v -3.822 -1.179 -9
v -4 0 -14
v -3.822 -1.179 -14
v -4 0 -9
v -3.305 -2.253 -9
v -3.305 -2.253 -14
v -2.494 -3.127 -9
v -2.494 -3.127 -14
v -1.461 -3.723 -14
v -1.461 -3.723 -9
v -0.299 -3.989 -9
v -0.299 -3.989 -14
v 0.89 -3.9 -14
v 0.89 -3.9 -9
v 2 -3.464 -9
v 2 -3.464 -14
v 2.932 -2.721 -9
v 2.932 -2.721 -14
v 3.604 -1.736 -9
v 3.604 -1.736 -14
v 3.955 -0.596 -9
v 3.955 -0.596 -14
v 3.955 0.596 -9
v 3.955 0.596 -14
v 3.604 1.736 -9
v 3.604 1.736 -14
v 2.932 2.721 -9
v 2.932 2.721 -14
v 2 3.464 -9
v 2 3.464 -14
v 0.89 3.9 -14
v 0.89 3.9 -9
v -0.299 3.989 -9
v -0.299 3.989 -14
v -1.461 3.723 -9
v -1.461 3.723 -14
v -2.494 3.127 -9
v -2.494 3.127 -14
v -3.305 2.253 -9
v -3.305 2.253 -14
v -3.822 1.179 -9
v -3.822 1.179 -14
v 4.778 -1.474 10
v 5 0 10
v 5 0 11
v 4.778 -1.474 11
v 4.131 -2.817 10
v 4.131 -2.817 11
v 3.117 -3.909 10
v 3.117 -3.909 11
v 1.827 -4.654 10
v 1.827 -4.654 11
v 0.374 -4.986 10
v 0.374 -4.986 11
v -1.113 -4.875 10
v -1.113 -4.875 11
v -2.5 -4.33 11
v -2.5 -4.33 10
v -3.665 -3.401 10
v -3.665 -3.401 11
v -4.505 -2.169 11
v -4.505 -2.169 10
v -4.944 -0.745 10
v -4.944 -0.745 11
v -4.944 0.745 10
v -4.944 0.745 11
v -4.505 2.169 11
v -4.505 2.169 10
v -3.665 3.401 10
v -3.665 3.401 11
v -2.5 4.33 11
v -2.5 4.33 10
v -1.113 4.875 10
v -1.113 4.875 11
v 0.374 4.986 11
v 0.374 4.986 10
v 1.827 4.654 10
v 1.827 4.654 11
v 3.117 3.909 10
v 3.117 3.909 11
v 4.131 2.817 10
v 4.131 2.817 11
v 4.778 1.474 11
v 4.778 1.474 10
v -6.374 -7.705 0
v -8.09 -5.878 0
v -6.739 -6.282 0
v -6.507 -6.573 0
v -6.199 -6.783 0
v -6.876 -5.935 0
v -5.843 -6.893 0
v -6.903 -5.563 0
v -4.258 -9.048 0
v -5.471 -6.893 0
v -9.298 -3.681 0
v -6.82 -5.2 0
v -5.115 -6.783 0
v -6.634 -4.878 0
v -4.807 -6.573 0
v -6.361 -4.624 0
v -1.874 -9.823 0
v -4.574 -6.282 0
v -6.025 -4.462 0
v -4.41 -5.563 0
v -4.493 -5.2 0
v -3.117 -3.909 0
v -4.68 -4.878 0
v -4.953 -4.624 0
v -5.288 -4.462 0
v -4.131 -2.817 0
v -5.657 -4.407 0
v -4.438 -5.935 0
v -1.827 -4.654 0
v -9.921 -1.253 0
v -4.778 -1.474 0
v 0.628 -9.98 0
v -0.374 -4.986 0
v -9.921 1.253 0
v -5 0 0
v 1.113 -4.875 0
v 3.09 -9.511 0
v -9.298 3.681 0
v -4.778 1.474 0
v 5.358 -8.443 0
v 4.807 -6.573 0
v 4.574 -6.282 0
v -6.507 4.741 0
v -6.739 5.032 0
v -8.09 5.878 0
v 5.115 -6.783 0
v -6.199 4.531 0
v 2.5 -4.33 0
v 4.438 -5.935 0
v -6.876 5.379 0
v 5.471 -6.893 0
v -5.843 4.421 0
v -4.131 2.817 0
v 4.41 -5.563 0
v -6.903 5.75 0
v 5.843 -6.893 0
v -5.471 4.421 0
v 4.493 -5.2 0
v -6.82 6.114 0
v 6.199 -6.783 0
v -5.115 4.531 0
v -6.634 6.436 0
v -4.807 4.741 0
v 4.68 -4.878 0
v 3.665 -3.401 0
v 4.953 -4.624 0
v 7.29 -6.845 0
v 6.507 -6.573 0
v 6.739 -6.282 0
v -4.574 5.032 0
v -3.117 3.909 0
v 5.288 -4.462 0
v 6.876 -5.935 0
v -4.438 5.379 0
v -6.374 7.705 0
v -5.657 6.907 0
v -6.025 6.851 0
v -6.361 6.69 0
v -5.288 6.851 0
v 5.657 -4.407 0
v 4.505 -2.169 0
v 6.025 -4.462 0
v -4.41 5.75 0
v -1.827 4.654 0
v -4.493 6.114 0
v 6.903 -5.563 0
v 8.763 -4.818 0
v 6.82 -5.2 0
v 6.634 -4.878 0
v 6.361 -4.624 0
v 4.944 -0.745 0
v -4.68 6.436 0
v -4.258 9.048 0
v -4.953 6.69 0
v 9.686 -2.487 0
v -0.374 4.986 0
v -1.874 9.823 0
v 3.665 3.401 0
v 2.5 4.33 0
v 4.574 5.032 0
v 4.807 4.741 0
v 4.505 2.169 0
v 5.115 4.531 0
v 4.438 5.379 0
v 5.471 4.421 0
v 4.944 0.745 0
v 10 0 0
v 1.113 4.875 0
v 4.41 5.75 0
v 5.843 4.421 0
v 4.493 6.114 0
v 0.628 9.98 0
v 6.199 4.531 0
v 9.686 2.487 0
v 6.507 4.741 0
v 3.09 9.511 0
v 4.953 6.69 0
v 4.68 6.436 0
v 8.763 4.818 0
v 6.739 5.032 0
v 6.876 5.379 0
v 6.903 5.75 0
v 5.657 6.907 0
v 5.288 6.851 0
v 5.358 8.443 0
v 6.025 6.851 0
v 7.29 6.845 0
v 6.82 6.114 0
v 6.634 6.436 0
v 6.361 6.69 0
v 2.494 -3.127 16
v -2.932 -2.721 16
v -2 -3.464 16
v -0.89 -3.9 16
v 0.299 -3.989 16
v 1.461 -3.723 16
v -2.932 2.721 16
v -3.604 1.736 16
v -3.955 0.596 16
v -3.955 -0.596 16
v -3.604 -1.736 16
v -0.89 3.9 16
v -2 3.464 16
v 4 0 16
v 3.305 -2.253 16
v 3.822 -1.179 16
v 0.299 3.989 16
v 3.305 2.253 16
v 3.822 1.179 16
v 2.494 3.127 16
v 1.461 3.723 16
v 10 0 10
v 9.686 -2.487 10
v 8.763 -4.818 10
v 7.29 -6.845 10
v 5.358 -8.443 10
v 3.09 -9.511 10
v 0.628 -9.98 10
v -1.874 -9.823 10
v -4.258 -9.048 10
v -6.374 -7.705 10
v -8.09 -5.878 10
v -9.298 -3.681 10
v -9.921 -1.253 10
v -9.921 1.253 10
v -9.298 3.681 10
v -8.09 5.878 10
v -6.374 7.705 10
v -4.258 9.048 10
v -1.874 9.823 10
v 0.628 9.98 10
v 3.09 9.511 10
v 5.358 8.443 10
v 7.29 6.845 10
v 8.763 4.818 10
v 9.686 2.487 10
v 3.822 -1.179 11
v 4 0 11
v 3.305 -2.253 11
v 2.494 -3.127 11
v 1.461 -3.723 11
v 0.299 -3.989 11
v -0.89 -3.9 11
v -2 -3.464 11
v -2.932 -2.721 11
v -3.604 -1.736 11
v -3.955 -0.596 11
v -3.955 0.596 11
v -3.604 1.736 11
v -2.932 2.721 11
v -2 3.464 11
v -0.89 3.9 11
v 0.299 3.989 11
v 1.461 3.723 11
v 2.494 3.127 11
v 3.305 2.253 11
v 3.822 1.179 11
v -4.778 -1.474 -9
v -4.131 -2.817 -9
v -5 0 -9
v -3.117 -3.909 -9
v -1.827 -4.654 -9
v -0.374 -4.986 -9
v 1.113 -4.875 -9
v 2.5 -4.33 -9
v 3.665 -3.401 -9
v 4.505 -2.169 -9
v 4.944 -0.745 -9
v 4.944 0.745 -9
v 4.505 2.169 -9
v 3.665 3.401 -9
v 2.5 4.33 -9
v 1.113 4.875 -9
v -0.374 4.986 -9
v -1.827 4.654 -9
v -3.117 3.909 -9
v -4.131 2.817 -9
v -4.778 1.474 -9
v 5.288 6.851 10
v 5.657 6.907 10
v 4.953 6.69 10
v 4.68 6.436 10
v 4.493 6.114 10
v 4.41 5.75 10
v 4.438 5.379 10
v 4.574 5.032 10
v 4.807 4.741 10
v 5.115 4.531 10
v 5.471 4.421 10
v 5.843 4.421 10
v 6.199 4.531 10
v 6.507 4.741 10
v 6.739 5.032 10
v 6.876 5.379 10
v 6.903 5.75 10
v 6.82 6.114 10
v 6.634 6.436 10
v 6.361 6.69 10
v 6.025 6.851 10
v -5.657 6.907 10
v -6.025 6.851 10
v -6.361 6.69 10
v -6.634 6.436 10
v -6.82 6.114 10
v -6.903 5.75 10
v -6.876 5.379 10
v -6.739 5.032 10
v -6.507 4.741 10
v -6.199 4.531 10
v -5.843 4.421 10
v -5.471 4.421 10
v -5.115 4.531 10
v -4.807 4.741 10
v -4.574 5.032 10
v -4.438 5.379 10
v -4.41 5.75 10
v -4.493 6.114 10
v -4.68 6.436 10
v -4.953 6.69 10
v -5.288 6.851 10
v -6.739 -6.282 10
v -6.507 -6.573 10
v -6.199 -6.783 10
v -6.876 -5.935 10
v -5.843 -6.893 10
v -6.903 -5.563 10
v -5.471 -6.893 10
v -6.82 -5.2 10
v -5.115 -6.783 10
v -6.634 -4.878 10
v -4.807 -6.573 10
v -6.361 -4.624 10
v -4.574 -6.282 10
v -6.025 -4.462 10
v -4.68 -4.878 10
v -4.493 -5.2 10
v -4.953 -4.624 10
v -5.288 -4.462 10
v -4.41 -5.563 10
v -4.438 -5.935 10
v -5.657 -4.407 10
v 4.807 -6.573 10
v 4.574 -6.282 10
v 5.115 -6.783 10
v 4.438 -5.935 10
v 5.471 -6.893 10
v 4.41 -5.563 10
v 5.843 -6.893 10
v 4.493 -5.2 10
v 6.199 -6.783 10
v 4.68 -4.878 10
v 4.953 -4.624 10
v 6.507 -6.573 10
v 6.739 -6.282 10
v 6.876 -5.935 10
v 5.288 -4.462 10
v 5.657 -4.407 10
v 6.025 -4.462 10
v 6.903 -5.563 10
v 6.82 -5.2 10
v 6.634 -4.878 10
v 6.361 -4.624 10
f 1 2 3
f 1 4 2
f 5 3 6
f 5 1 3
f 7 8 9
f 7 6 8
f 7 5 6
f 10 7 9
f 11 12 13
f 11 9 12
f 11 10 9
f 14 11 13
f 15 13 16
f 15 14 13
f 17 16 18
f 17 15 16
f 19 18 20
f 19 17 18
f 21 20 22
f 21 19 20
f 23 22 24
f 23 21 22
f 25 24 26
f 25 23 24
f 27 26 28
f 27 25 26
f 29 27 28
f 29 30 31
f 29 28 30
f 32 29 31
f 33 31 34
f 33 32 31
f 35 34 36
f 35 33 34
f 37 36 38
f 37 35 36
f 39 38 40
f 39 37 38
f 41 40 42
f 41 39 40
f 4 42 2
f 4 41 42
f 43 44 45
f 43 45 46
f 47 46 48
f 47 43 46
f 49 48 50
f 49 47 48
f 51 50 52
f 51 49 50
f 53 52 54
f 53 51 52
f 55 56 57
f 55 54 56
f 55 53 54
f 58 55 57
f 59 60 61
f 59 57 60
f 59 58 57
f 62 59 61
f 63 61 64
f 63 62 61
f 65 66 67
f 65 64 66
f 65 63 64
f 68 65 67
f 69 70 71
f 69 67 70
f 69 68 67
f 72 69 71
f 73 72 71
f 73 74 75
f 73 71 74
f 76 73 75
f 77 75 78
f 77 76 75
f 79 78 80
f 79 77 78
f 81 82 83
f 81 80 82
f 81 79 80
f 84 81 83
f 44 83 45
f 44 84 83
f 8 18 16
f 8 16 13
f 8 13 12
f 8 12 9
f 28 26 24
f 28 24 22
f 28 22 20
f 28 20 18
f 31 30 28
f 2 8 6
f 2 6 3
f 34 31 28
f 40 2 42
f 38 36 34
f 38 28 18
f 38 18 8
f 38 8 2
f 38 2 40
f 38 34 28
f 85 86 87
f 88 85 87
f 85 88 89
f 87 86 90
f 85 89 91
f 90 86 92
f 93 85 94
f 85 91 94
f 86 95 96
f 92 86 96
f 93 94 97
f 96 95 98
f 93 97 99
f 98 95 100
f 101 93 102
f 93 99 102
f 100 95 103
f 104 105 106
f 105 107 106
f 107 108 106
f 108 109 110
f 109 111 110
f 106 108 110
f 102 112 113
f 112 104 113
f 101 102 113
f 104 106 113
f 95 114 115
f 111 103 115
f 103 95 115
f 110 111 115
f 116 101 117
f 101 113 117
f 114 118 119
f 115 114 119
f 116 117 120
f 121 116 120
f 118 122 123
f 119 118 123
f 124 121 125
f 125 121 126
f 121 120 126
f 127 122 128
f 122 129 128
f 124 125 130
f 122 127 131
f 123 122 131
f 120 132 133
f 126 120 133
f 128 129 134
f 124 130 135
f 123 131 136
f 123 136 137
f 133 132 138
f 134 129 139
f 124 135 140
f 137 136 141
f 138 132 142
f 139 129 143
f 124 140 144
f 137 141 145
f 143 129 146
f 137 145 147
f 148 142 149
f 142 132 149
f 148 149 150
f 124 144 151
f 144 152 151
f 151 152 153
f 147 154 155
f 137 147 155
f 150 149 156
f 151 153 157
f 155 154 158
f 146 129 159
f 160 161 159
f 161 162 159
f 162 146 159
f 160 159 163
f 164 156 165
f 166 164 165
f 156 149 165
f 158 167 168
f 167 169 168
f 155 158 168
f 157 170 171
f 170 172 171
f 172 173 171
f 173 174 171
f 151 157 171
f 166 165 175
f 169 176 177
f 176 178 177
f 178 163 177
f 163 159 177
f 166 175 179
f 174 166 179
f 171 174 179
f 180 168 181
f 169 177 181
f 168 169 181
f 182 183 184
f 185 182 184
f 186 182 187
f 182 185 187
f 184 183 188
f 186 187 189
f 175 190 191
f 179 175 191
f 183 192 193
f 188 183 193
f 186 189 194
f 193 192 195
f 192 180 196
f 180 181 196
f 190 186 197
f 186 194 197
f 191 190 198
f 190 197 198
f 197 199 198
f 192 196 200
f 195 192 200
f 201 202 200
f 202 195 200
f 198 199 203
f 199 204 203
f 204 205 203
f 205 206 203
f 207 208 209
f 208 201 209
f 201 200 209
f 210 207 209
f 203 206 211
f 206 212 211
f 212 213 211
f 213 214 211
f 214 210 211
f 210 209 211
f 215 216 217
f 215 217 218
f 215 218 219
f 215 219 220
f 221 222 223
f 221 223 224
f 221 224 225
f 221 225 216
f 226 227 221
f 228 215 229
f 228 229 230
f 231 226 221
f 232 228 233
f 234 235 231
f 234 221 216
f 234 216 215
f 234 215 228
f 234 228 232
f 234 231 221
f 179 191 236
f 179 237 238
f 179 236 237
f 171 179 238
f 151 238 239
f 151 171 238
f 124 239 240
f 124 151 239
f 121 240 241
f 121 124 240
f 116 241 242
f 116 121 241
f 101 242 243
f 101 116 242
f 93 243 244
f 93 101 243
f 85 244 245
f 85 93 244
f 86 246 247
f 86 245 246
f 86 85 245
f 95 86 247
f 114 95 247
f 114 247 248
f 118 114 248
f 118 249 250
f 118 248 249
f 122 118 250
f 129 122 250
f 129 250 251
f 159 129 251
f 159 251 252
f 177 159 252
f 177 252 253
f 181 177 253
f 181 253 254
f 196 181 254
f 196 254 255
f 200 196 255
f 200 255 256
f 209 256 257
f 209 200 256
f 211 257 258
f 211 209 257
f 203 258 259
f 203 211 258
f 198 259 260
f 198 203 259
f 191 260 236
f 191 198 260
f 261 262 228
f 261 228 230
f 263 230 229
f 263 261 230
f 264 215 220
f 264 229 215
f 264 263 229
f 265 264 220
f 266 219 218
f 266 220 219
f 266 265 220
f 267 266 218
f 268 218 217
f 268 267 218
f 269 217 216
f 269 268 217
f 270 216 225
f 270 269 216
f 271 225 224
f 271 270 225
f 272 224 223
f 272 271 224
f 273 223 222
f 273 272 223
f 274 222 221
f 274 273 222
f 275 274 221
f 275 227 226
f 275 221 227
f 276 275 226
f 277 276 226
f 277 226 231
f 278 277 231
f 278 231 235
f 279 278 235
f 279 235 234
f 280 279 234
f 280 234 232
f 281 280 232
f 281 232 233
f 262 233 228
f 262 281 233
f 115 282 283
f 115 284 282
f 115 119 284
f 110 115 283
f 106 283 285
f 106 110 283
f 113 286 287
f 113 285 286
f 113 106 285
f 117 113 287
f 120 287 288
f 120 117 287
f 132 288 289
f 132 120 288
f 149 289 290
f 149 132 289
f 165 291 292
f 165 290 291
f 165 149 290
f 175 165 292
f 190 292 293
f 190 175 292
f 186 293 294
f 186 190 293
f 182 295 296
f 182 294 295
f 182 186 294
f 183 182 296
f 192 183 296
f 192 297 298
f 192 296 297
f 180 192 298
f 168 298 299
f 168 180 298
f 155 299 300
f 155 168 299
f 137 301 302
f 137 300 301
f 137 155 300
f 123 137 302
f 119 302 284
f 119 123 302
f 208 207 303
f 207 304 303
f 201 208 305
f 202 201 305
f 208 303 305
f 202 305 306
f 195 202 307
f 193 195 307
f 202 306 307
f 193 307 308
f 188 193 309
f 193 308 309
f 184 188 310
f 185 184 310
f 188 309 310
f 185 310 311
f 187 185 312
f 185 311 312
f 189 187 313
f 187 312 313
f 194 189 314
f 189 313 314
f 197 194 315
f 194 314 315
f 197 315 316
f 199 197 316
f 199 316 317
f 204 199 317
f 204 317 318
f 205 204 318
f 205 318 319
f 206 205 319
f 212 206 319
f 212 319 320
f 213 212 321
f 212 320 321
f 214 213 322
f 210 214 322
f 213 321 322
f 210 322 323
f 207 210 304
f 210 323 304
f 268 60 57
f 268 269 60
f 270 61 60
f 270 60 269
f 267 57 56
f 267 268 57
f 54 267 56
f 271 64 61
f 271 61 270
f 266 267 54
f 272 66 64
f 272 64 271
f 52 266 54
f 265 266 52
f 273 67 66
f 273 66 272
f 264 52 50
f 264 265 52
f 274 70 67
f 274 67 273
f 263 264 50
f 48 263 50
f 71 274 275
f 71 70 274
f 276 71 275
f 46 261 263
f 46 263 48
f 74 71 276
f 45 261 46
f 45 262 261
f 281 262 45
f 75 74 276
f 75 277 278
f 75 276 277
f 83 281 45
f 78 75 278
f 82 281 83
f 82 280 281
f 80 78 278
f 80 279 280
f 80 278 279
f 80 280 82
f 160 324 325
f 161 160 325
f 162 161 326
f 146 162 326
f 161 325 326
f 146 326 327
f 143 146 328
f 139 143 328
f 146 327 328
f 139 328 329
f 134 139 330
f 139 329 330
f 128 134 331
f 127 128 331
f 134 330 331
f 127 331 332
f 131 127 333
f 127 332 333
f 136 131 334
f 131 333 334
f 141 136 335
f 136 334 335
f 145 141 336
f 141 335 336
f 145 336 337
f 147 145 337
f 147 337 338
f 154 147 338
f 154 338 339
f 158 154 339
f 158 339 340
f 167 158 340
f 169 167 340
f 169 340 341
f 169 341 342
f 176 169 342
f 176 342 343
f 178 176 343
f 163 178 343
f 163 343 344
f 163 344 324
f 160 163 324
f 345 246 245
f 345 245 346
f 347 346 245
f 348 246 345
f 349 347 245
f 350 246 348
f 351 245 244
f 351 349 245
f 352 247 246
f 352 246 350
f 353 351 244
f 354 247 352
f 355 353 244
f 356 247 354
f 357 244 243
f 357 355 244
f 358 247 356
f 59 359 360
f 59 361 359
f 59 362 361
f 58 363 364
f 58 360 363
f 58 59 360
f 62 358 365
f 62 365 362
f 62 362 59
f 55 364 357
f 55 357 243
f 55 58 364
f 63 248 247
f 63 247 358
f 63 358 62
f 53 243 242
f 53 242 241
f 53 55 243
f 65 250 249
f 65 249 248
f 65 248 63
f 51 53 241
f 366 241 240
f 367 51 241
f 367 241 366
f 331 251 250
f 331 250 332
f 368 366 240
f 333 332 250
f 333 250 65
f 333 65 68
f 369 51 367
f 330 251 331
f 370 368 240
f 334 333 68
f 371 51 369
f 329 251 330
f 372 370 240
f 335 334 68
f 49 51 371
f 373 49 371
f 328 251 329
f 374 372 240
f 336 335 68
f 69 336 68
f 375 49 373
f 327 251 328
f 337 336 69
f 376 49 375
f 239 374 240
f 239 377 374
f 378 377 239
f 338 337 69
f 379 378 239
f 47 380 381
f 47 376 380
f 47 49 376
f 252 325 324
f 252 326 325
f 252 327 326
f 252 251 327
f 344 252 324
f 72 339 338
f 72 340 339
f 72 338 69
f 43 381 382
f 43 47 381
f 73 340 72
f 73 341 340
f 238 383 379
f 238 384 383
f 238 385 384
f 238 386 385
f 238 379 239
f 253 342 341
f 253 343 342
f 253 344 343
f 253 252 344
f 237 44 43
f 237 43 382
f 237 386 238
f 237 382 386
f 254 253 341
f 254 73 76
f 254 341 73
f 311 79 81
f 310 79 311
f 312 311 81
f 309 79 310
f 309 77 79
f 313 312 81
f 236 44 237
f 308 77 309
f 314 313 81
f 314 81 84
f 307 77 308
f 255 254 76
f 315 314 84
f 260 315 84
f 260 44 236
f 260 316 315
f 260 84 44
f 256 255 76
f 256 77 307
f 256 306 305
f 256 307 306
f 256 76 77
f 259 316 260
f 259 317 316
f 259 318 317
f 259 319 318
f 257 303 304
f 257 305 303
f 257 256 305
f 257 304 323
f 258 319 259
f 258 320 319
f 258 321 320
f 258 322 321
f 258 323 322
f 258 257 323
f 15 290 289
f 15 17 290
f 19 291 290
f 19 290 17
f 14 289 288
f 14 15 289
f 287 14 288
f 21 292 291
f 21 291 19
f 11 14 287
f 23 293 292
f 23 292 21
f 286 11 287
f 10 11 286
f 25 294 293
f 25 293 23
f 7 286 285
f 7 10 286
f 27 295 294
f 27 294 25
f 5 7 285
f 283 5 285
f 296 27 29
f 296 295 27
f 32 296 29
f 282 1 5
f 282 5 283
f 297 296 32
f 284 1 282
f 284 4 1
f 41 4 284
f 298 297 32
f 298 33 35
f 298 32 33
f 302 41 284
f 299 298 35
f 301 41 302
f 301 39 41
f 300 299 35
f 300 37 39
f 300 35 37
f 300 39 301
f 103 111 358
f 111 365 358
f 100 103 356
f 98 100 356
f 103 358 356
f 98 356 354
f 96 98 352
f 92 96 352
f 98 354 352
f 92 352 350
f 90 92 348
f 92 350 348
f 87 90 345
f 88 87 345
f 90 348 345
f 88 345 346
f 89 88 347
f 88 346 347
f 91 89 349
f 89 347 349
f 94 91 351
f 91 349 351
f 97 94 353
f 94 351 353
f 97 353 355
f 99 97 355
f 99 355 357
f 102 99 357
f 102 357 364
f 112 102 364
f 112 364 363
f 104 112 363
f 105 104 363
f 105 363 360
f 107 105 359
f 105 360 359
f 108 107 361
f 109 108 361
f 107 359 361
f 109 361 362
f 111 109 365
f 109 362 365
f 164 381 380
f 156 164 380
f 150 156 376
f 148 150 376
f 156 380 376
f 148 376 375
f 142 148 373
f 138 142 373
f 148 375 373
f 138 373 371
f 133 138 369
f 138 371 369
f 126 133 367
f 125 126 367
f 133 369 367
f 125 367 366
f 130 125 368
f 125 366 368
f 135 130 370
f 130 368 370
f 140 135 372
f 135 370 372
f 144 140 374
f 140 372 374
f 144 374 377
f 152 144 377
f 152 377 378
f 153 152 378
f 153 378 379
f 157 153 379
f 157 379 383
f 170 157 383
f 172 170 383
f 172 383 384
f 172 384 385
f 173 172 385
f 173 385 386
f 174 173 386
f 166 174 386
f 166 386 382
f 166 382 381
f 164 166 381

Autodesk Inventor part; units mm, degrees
ref_plane "YZ Plane" through (0, 0, 0) normal (1, 0, 0) x (0, 1, 0)
ref_plane "XZ Plane" through (0, 0, 0) normal (0, 1, 0) x (-1, 0, 0)
ref_plane "XY Plane" through (0, 0, 0) normal (0, 0, 1) x (1, 0, 0)
sketch "スケッチ1" plane through (0, 0, 0) normal (0, 0, 1) x (1, 0, 0)
  circle A0 centre (0, 0) radius 10
  dimension "d0" = 20
extrude "押し出し1" add sketch "スケッチ1" along normal blind 10
sketch "スケッチ2" plane through (0, 0, 10) normal (0, 0, 1) x (1, 0, 0)
  circle A0 centre (0, 0) radius 5
  dimension "d3" = 10
extrude "押し出し2" add sketch "スケッチ2" along normal blind 1
sketch "スケッチ3" plane through (0, 0, 11) normal (0, 0, 1) x (1, 0, 0)
  circle A0 centre (0, 0) radius 4
  dimension "d6" = 8
extrude "押し出し3" add sketch "スケッチ3" along normal blind 5
sketch "スケッチ4" plane through (0, 0, 0) normal (0, 0, -1) x (-1, 0, 0)
  circle A0 centre (0, 0) radius 5
  dimension "d9" = 10
extrude "押し出し4" add sketch "スケッチ4" along normal blind 9
sketch "スケッチ5" plane through (0, 0, -9) normal (0, 0, -1) x (-1, 0, 0)
  circle A0 centre (0, 0) radius 4
  dimension "d12" = 8
extrude "押し出し5" add sketch "スケッチ5" along normal blind 5
sketch "スケッチ6" plane through (0, 0, 0) normal (0, 0, -1) x (-1, 0, 0)
  circle A0 centre (0, 0) radius 8 construction
  line L0 (-5.6569, -5.6569) -> (5.6569, -5.6569) construction
  line L1 (5.6569, -5.6569) -> (5.6569, 5.6569) construction
  line L2 (5.6569, 5.6569) -> (-5.6569, 5.6569) construction
  line L3 (-5.6569, 5.6569) -> (-5.6569, -5.6569) construction
  line L4 (-5.6569, -5.6569) -> (5.6569, 5.6569) construction
  line L5 (5.6569, -5.6569) -> (-5.6569, 5.6569) construction
  dimension "d15" = 16
hole "穴1" at (-5.6569, 5.6569, 0) at (5.6569, 5.6569, 0) at (5.6569, -5.6569, 0) at (-5.6569, -5.6569, 0) direction (0, 0, 1) diameter 2.5 end through all
properties part number "AR20.0_wheel-shaft"
